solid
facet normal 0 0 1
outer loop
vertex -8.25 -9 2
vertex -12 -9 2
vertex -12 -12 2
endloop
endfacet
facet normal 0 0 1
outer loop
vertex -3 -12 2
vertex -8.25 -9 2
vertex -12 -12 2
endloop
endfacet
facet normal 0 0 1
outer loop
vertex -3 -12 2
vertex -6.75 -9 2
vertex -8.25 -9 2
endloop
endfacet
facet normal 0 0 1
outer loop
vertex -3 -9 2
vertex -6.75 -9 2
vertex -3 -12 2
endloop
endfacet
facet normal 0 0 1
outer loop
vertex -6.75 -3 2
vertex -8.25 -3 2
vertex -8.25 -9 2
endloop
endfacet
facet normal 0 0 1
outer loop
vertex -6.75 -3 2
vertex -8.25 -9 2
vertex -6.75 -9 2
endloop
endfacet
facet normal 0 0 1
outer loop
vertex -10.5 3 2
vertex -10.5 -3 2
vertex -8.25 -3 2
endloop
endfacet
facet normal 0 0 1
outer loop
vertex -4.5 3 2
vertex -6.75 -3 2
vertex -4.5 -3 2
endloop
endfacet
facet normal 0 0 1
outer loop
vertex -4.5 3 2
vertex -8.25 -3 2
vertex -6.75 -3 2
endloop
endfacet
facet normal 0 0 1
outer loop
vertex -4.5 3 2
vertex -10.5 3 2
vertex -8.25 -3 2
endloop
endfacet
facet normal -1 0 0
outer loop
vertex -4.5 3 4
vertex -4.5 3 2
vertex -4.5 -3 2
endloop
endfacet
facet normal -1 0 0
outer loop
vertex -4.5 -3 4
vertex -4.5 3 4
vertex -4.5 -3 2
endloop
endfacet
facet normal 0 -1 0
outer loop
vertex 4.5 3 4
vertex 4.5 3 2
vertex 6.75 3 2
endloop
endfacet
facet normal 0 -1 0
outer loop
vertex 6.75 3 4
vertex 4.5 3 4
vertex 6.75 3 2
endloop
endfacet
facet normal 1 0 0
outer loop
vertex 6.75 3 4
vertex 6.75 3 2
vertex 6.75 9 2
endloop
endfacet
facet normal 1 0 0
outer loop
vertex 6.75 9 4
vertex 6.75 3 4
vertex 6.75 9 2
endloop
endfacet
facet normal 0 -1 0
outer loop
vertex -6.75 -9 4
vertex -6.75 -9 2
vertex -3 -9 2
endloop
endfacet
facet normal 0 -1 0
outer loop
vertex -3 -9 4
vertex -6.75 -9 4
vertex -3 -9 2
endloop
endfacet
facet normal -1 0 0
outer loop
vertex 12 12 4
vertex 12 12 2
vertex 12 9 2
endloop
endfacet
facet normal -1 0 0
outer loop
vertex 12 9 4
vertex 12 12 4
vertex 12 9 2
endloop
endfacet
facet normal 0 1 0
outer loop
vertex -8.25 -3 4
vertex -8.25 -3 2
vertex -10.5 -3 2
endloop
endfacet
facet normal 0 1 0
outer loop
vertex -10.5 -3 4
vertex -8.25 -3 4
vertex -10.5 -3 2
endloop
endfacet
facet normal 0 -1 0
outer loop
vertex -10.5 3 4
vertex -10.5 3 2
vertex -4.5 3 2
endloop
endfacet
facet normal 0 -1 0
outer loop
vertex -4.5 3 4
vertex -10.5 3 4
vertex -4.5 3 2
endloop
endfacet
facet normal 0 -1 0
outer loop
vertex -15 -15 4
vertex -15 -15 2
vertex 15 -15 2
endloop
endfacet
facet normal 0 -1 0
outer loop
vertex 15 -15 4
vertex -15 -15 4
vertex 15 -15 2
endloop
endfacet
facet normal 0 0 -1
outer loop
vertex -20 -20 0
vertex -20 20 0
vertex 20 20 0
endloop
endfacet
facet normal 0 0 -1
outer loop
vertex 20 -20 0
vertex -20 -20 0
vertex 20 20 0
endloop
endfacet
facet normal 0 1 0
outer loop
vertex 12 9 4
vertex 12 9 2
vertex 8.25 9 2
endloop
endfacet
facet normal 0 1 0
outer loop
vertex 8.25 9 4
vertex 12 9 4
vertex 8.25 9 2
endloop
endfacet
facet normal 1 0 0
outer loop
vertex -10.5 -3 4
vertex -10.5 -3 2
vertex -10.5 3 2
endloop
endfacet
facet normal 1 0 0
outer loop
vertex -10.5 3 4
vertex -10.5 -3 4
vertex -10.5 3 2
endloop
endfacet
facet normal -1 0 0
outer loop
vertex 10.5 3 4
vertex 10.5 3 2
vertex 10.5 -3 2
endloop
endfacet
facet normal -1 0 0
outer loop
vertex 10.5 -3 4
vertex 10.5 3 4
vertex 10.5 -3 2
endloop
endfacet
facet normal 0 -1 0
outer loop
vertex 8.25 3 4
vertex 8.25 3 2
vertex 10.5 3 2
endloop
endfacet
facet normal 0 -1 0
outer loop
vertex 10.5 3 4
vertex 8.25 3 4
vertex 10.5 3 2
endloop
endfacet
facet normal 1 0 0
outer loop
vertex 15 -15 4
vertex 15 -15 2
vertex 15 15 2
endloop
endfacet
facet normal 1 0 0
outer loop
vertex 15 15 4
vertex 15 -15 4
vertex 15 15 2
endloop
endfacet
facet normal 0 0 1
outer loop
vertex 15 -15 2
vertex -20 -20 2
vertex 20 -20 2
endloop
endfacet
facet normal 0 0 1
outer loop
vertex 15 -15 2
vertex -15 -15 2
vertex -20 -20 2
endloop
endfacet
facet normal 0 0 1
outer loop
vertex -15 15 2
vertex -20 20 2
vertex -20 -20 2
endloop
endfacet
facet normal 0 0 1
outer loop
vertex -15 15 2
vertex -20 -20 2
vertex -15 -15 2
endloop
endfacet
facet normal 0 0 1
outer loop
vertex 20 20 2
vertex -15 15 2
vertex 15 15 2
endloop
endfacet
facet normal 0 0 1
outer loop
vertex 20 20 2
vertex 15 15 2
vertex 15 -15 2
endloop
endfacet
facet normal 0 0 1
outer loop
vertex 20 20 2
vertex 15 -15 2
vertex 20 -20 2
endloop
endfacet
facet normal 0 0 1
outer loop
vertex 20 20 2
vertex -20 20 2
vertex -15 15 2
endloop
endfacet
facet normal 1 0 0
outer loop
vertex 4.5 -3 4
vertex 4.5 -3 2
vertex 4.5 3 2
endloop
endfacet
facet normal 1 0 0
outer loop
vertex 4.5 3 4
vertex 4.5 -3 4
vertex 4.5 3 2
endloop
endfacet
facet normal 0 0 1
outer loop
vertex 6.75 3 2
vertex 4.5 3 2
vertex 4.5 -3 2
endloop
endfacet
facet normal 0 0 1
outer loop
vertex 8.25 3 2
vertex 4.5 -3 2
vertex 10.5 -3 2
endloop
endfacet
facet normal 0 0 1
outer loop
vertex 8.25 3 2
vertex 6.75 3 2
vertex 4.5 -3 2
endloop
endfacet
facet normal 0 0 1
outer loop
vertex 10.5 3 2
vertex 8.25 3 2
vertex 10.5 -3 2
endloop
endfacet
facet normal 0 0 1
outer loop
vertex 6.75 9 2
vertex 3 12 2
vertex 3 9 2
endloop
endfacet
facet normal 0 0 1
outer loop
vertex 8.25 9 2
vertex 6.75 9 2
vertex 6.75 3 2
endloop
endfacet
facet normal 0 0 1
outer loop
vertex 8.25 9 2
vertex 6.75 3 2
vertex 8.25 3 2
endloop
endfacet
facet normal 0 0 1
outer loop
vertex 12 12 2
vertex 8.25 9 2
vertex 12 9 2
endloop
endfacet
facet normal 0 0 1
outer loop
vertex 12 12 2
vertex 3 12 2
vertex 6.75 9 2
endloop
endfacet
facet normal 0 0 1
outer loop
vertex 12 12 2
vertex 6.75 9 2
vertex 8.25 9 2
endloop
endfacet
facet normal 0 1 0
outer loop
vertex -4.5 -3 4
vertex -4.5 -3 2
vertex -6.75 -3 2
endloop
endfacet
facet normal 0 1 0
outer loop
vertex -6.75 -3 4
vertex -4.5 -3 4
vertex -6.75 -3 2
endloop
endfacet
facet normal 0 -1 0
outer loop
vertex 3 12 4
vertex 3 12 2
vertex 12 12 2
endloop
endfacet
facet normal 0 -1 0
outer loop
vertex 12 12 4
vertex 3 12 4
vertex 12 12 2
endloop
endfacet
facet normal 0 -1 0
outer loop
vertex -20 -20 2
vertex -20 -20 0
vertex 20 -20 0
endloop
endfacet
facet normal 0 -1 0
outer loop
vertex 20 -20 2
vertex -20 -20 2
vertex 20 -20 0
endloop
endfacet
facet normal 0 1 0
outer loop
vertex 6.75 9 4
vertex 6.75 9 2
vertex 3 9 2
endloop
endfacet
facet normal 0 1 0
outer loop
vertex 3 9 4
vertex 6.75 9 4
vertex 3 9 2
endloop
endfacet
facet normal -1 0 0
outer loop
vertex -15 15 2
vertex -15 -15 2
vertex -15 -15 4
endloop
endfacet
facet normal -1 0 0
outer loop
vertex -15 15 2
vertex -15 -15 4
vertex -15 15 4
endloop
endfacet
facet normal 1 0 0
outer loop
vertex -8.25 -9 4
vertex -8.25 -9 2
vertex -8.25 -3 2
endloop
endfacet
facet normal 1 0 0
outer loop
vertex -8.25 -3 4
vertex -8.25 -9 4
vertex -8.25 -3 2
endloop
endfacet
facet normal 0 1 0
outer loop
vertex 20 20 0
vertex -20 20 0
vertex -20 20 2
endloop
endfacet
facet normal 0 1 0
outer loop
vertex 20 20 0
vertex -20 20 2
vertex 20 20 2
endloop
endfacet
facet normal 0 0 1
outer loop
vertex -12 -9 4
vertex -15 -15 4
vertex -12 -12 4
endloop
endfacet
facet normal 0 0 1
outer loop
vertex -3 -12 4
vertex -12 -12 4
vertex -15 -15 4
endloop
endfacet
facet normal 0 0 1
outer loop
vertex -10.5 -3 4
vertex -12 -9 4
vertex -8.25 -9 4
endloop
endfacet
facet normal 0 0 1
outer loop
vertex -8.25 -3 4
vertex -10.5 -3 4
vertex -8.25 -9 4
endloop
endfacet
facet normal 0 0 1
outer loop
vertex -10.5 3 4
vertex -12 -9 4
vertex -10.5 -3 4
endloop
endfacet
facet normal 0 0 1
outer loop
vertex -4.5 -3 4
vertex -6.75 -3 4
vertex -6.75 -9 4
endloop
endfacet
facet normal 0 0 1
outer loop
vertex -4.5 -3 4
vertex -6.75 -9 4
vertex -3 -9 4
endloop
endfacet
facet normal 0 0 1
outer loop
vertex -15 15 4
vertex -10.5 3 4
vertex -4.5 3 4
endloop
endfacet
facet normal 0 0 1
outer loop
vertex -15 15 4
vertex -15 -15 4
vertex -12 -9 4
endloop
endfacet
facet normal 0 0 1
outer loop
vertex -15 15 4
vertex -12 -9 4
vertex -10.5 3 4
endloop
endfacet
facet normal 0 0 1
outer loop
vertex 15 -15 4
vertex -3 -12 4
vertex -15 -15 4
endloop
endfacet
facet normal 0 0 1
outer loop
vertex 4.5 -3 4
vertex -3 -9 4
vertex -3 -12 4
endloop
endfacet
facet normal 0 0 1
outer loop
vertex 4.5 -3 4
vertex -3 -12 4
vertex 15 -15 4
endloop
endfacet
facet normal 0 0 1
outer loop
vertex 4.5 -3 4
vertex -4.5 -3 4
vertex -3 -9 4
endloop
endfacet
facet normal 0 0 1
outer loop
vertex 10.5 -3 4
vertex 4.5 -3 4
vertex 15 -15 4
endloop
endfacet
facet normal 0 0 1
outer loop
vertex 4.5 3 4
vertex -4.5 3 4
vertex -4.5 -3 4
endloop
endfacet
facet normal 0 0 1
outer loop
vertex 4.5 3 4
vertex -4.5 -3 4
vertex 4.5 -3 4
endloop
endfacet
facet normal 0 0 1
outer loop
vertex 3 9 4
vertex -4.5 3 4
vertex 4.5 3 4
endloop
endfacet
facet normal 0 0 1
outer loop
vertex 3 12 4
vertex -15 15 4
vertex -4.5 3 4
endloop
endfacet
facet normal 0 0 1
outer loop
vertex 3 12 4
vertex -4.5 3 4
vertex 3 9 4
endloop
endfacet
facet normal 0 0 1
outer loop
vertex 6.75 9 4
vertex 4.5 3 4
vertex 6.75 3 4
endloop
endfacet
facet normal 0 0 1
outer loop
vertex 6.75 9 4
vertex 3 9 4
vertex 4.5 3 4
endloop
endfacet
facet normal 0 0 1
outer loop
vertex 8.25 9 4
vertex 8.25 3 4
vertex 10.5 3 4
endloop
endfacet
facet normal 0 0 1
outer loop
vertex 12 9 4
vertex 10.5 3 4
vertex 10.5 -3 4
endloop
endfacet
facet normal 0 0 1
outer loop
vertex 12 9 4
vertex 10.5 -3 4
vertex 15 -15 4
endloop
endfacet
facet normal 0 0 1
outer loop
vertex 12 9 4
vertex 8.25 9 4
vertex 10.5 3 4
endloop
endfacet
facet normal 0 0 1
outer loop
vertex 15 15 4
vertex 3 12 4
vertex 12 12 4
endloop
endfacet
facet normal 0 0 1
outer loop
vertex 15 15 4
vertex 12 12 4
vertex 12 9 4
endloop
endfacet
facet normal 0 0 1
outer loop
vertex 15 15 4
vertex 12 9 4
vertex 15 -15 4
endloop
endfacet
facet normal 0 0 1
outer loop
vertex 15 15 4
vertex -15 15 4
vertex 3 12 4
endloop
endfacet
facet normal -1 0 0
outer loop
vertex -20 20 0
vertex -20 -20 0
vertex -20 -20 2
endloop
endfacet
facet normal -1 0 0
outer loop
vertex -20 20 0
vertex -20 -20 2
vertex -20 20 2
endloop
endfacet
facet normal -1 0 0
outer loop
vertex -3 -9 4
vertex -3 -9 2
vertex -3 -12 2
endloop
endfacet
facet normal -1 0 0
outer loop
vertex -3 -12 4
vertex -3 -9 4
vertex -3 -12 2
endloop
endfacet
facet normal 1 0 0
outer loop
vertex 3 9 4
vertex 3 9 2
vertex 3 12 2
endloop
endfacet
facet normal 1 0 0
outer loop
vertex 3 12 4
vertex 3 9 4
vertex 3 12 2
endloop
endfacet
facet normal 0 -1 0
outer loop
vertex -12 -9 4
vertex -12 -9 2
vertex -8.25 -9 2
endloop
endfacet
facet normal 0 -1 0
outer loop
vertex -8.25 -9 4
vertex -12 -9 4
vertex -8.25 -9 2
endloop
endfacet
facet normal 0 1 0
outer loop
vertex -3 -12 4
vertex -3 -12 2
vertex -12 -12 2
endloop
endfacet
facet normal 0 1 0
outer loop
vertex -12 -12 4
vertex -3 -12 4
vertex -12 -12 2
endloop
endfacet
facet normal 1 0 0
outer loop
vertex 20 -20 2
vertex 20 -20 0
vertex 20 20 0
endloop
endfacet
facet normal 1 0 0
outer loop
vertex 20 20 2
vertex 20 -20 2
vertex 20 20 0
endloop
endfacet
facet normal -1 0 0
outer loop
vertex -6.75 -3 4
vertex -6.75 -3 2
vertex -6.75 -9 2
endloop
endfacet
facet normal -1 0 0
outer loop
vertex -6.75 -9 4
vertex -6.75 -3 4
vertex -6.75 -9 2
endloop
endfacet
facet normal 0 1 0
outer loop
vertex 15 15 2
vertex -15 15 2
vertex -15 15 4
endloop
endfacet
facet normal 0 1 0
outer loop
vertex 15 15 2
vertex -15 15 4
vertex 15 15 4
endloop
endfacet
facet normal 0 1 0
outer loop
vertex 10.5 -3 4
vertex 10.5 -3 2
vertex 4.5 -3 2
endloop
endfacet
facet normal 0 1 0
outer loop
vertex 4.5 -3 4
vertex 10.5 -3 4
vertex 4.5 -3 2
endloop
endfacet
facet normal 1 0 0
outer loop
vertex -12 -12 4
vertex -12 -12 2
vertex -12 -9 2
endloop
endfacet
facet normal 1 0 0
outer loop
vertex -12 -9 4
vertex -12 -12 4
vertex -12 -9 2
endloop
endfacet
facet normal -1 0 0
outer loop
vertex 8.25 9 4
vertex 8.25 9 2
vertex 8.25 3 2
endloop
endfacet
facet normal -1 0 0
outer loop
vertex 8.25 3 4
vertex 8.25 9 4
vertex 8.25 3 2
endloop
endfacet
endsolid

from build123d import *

# Parameters (mm, degrees)
F0_W     = 40
F0_H     = 40
F1_DEPTH = 2
F2_W     = 30
F2_H     = 30
F3_DEPTH = 2


with BuildPart() as f1:
    # F0 (on Top) → F1 (new body)
    with BuildSketch(Plane.XY):
        Rectangle(F0_W, F0_H)
    extrude(amount=F1_DEPTH)

    # F2 (on face) → F3 (join)
    with BuildSketch(Plane.XY.offset(2)):
        Rectangle(F2_W, F2_H)
        Polygon((-8.25, -9), (-8.25, -3), (-10.5, -3), (-10.5, 3), (-4.5, 3), (-4.5, -3), (-6.75, -3), (-6.75, -9), (-3, -9), (-3, -12), (-12, -12), (-12, -9), align=None, mode=Mode.SUBTRACT)
        Polygon((10.5, -3), (8.25, -3), (6.75, -3), (4.5, -3), (4.5, 3), (6.75, 3), (6.75, 9), (3, 9), (3, 12), (12, 12), (12, 9), (8.25, 9), (8.25, 3), (10.5, 3), align=None, mode=Mode.SUBTRACT)
    extrude(amount=F3_DEPTH)


solid = f1.part
